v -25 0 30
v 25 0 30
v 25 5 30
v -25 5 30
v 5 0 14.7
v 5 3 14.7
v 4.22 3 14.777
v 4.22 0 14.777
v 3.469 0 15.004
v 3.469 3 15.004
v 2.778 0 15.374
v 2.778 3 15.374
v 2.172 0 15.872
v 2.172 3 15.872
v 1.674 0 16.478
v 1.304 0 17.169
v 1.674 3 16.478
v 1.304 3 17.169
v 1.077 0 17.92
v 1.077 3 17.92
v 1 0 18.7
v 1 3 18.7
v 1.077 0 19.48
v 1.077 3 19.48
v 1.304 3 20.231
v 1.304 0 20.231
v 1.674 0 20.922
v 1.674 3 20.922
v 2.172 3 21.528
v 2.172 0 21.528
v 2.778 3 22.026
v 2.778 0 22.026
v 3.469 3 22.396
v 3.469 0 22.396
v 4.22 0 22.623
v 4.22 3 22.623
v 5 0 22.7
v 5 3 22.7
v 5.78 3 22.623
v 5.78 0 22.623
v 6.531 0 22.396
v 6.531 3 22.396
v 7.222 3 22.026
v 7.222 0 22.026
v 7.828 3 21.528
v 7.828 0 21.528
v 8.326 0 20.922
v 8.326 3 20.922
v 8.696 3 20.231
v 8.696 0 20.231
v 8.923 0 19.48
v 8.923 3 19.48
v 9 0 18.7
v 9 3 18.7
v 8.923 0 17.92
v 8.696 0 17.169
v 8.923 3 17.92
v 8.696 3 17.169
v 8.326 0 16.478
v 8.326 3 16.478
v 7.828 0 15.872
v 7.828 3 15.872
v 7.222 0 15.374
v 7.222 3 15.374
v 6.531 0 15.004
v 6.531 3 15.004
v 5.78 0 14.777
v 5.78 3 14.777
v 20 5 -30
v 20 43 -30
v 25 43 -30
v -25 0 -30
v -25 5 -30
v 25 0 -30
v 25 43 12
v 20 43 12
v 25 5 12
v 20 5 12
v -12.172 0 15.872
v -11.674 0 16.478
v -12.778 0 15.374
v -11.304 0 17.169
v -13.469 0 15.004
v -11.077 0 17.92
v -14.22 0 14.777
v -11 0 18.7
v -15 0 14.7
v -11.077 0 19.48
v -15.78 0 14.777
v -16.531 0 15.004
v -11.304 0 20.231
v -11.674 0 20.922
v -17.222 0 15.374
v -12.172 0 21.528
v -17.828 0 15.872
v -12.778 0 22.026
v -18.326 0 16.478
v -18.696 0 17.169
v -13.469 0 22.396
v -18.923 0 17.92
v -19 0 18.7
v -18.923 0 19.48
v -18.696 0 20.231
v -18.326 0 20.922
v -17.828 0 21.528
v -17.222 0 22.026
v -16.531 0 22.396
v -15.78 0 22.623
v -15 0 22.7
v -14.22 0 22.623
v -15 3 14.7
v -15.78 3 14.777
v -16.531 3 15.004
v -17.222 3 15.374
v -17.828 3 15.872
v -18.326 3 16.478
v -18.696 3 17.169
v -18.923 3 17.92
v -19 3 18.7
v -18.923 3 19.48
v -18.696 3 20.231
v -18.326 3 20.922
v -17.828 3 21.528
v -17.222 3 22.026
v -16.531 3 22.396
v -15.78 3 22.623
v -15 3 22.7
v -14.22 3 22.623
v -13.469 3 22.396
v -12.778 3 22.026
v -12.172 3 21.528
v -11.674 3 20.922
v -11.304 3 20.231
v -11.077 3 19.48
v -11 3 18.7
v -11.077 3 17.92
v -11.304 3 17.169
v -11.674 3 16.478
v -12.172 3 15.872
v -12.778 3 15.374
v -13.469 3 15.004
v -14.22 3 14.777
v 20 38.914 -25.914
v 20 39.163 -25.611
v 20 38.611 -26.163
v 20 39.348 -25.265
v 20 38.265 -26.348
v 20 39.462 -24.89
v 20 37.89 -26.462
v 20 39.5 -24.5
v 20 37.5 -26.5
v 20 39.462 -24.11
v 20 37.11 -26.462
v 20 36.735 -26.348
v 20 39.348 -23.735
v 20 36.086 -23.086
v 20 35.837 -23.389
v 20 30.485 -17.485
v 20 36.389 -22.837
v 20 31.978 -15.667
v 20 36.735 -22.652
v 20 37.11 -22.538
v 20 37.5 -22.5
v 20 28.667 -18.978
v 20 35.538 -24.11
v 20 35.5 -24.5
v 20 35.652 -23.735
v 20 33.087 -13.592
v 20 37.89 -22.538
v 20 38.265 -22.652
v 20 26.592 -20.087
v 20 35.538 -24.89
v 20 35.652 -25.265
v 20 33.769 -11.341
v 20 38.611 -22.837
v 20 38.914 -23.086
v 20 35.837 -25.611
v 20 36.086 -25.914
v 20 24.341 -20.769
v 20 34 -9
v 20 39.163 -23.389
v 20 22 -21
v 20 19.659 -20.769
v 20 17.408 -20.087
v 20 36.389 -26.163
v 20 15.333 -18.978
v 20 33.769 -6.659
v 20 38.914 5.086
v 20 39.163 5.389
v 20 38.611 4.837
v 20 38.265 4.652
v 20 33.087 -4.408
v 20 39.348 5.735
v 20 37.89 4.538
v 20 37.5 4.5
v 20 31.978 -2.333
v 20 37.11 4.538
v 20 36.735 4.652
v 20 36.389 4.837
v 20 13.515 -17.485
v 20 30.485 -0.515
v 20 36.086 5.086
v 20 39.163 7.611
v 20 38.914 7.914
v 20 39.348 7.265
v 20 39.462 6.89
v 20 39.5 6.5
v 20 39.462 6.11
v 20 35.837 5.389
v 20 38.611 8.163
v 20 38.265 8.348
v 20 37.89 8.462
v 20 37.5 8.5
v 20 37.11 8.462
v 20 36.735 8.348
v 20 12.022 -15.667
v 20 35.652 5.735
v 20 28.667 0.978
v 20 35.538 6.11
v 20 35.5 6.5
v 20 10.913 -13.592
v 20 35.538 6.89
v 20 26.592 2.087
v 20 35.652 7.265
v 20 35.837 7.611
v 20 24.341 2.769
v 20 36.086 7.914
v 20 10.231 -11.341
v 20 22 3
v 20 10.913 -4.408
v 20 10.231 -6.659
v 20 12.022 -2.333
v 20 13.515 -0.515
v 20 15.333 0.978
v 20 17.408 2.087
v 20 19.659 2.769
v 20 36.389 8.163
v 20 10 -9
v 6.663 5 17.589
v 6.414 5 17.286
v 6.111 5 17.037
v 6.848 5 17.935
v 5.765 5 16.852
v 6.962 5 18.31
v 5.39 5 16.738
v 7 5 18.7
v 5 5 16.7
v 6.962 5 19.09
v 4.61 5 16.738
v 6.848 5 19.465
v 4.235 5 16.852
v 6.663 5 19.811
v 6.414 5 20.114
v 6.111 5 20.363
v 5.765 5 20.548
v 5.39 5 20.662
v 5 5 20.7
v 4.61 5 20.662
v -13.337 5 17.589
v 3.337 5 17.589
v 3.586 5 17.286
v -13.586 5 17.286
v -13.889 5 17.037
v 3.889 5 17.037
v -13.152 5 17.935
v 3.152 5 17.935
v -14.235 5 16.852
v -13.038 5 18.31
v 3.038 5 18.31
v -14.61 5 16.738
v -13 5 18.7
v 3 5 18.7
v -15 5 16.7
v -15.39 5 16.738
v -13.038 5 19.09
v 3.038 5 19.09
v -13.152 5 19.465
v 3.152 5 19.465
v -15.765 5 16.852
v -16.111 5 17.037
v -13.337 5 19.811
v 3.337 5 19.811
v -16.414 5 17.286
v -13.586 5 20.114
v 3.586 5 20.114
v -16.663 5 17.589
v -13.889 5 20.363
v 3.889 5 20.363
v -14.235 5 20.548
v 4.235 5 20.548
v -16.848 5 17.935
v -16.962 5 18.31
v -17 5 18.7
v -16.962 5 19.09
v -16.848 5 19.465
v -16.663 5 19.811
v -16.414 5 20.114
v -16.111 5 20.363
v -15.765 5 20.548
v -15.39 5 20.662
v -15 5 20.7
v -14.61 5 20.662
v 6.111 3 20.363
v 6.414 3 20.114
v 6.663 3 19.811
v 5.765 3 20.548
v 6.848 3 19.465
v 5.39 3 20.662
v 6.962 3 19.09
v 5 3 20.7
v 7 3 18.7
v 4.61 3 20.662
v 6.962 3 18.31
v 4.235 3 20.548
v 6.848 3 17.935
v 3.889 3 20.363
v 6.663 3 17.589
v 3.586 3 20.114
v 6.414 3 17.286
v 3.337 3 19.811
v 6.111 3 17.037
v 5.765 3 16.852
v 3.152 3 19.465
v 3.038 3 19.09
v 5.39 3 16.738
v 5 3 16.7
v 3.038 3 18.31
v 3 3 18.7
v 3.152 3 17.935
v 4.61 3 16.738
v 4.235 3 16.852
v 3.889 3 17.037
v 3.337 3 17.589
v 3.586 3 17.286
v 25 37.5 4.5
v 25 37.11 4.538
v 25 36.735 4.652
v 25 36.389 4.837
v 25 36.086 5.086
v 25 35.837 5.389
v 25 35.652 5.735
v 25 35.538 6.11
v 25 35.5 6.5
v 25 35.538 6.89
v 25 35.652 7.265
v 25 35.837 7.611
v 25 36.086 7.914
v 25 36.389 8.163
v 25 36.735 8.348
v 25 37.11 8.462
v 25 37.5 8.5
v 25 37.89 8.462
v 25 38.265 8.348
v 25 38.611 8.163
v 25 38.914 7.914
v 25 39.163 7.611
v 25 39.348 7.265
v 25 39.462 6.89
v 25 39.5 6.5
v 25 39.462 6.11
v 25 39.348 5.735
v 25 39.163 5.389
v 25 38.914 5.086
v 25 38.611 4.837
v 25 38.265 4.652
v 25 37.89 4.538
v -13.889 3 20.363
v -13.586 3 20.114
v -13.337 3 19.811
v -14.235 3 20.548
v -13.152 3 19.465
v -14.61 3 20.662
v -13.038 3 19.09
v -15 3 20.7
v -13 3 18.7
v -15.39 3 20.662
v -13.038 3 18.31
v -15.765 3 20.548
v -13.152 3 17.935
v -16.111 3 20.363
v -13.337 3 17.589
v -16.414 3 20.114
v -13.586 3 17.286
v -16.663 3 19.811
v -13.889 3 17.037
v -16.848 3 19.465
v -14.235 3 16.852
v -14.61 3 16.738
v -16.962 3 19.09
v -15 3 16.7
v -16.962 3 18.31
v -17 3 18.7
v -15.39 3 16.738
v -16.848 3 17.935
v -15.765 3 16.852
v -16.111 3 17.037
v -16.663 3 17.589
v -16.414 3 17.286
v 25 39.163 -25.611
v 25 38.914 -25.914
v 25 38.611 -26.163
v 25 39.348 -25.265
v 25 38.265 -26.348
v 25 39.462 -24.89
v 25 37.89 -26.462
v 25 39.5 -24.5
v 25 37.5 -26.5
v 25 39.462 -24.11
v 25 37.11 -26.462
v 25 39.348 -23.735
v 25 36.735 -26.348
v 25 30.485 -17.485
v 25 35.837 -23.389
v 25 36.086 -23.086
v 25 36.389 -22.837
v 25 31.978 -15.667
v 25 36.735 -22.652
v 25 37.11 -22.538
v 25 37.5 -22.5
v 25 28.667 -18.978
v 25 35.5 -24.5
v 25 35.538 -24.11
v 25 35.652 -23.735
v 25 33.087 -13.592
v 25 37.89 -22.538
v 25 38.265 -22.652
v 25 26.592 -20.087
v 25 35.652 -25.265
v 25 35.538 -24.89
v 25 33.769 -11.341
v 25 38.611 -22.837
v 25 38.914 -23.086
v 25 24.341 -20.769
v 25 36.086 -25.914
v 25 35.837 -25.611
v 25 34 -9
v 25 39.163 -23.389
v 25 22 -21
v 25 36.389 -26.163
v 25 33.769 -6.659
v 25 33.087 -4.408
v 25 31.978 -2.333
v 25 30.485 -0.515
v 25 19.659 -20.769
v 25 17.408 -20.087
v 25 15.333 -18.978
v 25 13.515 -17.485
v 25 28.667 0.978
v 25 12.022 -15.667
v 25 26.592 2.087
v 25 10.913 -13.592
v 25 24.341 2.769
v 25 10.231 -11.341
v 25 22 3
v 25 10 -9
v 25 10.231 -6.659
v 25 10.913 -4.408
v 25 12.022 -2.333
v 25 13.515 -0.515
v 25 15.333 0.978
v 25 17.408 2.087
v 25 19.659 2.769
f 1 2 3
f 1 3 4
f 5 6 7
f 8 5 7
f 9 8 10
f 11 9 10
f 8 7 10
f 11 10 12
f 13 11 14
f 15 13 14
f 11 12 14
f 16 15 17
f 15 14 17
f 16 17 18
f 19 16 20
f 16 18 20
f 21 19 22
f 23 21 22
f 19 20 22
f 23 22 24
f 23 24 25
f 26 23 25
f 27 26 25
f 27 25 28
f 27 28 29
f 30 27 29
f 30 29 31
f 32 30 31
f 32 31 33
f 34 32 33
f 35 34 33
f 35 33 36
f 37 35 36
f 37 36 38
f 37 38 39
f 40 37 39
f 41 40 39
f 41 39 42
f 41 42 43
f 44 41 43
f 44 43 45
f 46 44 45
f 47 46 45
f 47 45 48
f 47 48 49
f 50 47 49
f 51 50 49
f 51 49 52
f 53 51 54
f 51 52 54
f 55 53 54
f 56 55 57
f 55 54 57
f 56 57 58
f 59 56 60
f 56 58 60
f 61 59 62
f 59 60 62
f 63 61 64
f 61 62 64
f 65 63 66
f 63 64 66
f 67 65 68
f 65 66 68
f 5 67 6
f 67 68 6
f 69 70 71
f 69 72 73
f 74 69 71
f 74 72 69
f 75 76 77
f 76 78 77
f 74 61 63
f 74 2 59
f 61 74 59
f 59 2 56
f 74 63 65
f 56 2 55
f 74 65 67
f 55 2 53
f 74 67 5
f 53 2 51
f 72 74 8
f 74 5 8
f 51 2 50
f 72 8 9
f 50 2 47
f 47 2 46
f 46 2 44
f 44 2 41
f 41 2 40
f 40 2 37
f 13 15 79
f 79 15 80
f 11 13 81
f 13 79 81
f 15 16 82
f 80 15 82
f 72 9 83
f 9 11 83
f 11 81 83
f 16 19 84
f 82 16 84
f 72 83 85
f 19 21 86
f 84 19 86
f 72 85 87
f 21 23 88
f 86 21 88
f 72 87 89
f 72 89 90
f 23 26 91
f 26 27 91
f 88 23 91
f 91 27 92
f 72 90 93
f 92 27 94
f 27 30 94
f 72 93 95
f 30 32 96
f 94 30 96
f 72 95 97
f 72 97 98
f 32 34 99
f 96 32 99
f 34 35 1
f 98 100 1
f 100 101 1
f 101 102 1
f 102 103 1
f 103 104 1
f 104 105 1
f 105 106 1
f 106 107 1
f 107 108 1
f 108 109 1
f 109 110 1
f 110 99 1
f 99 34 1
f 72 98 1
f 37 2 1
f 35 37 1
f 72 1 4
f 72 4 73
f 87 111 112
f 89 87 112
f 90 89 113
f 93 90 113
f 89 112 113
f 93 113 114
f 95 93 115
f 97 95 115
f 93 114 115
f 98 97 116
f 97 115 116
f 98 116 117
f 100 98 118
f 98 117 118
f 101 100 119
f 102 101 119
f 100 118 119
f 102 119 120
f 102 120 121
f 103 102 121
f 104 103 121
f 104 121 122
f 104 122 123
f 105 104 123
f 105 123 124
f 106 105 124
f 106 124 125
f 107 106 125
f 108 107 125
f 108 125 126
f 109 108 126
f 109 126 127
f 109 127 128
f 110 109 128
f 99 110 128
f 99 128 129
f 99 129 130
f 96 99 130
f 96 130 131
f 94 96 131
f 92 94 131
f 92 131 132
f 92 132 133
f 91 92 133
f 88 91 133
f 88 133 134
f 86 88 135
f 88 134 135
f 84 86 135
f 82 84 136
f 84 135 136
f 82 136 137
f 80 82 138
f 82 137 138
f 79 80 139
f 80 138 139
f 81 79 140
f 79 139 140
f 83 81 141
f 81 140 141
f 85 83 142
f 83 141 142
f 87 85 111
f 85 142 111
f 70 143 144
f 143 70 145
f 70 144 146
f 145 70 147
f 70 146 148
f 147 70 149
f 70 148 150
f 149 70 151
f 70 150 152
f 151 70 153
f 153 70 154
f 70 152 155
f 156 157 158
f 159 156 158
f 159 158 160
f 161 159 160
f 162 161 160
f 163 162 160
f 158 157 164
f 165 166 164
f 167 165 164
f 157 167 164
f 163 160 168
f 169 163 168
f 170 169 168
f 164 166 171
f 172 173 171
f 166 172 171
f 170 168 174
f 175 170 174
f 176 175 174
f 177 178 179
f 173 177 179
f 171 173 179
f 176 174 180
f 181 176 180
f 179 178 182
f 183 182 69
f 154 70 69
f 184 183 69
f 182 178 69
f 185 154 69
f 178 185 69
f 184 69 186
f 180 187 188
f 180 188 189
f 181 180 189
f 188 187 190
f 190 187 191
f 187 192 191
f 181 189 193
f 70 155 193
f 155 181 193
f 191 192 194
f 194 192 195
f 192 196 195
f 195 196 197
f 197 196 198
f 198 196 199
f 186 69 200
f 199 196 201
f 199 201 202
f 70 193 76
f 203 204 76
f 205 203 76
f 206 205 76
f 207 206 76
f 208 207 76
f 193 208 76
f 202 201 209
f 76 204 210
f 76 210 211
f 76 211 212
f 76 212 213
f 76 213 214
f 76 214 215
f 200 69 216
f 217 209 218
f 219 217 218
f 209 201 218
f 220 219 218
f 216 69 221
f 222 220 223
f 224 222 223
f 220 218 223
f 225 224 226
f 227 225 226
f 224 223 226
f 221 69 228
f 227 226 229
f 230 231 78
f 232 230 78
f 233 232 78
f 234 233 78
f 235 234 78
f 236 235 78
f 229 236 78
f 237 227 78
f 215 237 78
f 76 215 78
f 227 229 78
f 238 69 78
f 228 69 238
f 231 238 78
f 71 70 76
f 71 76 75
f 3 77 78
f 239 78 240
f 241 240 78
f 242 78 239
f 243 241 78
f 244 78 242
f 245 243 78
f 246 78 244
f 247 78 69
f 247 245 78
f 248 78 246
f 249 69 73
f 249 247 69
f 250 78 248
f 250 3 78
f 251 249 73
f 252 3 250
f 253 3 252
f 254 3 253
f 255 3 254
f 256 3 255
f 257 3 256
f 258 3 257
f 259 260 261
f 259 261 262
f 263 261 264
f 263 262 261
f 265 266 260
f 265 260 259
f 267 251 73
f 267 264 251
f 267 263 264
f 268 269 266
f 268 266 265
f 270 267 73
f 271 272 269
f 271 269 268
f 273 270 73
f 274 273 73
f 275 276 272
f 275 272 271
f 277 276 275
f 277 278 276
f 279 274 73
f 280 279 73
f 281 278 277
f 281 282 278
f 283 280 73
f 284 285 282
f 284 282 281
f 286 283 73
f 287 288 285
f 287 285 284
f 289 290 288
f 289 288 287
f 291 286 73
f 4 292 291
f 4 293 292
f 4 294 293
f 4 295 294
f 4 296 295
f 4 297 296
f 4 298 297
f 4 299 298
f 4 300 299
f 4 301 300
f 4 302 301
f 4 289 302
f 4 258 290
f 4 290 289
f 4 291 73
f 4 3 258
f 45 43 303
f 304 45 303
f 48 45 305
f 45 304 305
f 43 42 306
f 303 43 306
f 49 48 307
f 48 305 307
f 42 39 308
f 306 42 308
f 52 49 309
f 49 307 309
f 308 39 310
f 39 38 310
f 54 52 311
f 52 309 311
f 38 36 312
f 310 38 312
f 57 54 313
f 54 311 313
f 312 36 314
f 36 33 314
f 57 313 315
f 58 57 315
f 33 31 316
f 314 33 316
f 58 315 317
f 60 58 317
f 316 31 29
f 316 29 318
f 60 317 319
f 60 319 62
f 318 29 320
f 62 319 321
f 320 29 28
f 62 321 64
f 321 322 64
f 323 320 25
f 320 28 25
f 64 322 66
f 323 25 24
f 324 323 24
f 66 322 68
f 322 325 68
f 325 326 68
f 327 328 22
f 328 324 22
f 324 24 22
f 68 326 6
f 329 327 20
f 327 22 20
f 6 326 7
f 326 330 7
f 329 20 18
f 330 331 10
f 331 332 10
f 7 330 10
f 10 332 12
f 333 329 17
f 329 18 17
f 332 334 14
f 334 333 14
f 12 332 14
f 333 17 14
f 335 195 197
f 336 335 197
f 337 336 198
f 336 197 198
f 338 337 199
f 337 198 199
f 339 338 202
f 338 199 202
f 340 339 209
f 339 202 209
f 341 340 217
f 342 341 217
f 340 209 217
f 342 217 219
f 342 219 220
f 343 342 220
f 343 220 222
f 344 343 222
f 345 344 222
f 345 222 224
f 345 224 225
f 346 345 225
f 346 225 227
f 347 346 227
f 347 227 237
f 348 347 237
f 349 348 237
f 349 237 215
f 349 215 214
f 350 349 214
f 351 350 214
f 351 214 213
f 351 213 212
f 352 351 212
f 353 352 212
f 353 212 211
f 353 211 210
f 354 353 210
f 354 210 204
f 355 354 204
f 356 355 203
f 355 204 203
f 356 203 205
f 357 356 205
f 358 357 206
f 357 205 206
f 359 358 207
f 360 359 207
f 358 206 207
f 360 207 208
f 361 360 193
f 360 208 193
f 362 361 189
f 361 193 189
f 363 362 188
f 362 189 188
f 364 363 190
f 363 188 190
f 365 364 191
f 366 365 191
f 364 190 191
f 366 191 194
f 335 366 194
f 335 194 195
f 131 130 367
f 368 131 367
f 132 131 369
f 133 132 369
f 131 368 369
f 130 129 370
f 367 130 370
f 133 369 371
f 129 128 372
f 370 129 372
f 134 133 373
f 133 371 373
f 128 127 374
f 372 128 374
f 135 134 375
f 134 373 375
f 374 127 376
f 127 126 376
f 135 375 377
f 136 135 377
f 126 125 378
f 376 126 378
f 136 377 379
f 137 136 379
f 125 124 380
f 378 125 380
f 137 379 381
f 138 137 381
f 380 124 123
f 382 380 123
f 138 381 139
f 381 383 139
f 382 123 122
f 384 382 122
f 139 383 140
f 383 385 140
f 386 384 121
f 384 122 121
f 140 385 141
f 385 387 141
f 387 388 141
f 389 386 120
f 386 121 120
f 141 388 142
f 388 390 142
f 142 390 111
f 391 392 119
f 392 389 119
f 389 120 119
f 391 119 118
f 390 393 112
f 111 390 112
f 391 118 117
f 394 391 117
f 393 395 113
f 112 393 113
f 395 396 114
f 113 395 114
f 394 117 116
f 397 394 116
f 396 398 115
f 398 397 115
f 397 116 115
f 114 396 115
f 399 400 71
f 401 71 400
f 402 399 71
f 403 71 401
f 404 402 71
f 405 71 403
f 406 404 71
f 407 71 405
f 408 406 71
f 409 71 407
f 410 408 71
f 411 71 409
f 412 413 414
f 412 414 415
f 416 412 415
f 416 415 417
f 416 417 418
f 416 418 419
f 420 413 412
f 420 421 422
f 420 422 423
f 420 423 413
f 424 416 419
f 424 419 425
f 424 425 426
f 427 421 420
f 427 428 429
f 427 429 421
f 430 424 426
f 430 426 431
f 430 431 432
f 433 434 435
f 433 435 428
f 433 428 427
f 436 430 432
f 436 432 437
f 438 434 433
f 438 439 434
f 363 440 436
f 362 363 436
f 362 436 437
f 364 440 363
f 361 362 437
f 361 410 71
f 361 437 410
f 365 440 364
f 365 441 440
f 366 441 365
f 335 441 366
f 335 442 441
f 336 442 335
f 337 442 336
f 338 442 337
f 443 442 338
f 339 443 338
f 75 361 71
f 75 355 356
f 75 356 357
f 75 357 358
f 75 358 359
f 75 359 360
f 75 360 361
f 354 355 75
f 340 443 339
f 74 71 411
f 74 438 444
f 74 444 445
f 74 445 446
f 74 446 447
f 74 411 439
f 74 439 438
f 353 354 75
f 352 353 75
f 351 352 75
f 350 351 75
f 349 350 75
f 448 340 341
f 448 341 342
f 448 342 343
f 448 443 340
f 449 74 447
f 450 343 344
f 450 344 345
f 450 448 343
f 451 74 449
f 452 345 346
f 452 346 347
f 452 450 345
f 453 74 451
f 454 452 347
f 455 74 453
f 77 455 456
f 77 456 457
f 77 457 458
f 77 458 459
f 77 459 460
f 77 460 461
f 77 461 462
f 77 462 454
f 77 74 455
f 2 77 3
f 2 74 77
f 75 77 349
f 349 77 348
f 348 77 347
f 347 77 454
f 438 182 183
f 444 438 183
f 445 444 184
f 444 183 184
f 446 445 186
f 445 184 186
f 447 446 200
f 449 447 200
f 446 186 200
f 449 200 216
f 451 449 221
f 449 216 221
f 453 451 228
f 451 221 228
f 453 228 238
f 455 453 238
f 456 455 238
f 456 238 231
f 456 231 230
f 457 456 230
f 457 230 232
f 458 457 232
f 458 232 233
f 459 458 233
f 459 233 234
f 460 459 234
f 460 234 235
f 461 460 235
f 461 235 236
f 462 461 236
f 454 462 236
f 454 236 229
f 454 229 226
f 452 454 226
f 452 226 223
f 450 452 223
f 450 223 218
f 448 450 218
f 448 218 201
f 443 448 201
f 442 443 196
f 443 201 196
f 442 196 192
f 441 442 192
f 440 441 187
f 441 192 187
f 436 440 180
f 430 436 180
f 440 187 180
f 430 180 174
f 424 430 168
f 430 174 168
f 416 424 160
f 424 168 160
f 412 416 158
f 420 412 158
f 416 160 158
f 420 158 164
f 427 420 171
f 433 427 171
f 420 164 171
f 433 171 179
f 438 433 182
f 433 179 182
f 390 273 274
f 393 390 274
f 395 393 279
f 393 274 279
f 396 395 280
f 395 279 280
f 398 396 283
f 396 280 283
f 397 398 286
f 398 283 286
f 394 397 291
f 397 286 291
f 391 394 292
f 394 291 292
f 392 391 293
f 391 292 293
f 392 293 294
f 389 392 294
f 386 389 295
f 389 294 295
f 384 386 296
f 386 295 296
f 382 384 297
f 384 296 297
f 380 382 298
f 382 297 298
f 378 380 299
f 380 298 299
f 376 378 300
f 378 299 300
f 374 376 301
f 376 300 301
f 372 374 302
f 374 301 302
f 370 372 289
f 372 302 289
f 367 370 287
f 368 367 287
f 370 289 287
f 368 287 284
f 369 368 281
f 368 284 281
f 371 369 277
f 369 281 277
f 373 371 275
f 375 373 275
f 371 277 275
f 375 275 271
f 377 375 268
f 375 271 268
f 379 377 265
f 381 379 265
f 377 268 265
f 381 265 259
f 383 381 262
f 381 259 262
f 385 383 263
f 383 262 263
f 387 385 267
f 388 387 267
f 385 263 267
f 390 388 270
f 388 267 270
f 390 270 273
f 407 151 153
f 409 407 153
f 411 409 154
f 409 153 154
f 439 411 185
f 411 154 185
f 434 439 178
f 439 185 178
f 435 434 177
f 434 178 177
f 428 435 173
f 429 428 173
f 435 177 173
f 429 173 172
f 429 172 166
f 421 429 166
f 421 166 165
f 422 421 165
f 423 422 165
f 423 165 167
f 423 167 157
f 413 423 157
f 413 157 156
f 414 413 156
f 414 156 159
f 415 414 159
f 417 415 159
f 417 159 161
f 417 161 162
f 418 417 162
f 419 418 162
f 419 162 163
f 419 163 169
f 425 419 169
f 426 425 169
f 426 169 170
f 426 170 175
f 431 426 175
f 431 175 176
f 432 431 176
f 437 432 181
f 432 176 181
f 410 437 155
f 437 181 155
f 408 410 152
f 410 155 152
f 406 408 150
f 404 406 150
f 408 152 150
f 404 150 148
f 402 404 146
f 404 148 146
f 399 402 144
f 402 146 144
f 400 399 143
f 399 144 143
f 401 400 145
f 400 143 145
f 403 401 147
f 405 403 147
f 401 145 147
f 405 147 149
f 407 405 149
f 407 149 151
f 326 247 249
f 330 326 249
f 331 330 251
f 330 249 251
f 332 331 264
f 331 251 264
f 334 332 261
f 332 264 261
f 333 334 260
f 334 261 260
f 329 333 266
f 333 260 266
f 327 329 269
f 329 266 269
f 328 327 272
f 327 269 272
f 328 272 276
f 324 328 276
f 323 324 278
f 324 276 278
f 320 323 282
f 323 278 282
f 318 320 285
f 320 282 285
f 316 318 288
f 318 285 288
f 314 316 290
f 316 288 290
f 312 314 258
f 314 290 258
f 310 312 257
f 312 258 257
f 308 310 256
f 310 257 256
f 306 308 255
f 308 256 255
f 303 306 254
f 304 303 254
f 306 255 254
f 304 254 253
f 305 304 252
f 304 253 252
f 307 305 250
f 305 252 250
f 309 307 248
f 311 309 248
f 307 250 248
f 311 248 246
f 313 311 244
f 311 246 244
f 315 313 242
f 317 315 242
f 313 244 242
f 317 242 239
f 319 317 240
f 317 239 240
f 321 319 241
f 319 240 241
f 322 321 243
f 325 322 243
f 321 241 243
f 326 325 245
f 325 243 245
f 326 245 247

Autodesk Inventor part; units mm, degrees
ref_plane "YZ Plane" through (0, 0, 0) normal (1, 0, 0) x (0, 1, 0)
ref_plane "XZ Plane" through (0, 0, 0) normal (0, 1, 0) x (-1, 0, 0)
ref_plane "XY Plane" through (0, 0, 0) normal (0, 0, 1) x (1, 0, 0)
sketch "Skizze1" plane through (0, 0, 0) normal (0, 1, 0) x (-1, 0, 0)
  line L0 (-25, 30) -> (25, 30)
  line L1 (25, 30) -> (25, -30)
  line L2 (25, -30) -> (-25, -30)
  line L3 (-25, -30) -> (-25, 30)
  line L4 (-25, 30) -> (25, -30) construction
  line L5 (25, 30) -> (-25, -30) construction
  point P0 (0, 0)
  dimension "d0" = 50
  dimension "d1" = 60
extrude "Extrusion1" add sketch "Skizze1" along normal blind 5
sketch "Skizze2" plane through (0, 5, 0) normal (0, 1, 0) x (1, 0, 0)
  line L0 (-25, -30) -> (25, -30) projected
  line L1 (25, -30) -> (25, 30) projected
  line L2 (25, 30) -> (-25, 30) projected
  line L3 (-25, 30) -> (-25, -30) projected
  line L4 (25, -30) -> (25, 30) projected
  line L5 (25, 30) -> (20, 30)
  line L6 (20, 30) -> (20, -12)
  line L7 (20, -12) -> (25, -12)
  line L8 (25, -12) -> (25, 30)
  point P0 (0, 0)
  dimension "d8" = 5
  dimension "d9" = 42
extrude "Extrusion2" add sketch "Skizze2" along normal blind 38 contours L7 L6 L2 L1
sketch "Skizze3" plane through (25, 0, 30) normal (1, 0, 0) x (0, 0, -1)
  line L0 (60, 0) -> (0, 0) projected
  line L1 (60, 0) -> (60, 43) projected
  line L2 (18, 43) -> (60, 43) projected
  line L3 (18, 5) -> (18, 43) projected
  line L4 (0, 5) -> (18, 5) projected
  line L5 (0, 0) -> (0, 5) projected
  line L6 (39, -5.2039) -> (39, 72.0028) construction
  line L7 (23.5, 6.5) -> (54.5, 6.5) construction
  line L8 (54.5, 6.5) -> (54.5, 37.5) construction
  line L9 (54.5, 37.5) -> (23.5, 37.5) construction
  line L10 (23.5, 37.5) -> (23.5, 6.5) construction
  line L11 (23.5, 6.5) -> (54.5, 37.5) construction
  line L12 (54.5, 6.5) -> (23.5, 37.5) construction
  point P0 (30, 0)
  point P1 (39, 22)
  dimension "d10" = 21
  dimension "d11" = 17
  dimension "d19" = 31
  dimension "d20" = 31
hole "Bohrung1" at (25, 22, -9) direction (-1, 0, 0) diameter 24 end through all
hole "Bohrung2" at (25, 37.5, 6.5) at (25, 37.5, -24.5) direction (-1, 0, 0) diameter 4 end through all
sketch "Skizze5" plane through (0, 0, 0) normal (0, -1, 0) x (1, 0, 0)
  line L0 (25, 30) -> (-25, 30) projected
  line L1 (-25, 30) -> (-25, -30) projected
  line L2 (-25, -30) -> (25, -30) projected
  line L3 (25, -30) -> (25, 30) projected
  line L4 (32.3204, 18.7) -> (-38.6965, 18.7) construction
  point P0 (0, 0)
  point P1 (-15, 18.7)
  point P2 (5, 18.7)
  dimension "d31" = 11.3
  dimension "d32" = 10
  dimension "d33" = 20
hole "Bohrung3" at (-15, 0, 18.7) at (5, 0, 18.7) direction (0, 1, 0) diameter 4 end through all counterbore diameter 8 counterbore depth 3
properties part number "Backplate"
